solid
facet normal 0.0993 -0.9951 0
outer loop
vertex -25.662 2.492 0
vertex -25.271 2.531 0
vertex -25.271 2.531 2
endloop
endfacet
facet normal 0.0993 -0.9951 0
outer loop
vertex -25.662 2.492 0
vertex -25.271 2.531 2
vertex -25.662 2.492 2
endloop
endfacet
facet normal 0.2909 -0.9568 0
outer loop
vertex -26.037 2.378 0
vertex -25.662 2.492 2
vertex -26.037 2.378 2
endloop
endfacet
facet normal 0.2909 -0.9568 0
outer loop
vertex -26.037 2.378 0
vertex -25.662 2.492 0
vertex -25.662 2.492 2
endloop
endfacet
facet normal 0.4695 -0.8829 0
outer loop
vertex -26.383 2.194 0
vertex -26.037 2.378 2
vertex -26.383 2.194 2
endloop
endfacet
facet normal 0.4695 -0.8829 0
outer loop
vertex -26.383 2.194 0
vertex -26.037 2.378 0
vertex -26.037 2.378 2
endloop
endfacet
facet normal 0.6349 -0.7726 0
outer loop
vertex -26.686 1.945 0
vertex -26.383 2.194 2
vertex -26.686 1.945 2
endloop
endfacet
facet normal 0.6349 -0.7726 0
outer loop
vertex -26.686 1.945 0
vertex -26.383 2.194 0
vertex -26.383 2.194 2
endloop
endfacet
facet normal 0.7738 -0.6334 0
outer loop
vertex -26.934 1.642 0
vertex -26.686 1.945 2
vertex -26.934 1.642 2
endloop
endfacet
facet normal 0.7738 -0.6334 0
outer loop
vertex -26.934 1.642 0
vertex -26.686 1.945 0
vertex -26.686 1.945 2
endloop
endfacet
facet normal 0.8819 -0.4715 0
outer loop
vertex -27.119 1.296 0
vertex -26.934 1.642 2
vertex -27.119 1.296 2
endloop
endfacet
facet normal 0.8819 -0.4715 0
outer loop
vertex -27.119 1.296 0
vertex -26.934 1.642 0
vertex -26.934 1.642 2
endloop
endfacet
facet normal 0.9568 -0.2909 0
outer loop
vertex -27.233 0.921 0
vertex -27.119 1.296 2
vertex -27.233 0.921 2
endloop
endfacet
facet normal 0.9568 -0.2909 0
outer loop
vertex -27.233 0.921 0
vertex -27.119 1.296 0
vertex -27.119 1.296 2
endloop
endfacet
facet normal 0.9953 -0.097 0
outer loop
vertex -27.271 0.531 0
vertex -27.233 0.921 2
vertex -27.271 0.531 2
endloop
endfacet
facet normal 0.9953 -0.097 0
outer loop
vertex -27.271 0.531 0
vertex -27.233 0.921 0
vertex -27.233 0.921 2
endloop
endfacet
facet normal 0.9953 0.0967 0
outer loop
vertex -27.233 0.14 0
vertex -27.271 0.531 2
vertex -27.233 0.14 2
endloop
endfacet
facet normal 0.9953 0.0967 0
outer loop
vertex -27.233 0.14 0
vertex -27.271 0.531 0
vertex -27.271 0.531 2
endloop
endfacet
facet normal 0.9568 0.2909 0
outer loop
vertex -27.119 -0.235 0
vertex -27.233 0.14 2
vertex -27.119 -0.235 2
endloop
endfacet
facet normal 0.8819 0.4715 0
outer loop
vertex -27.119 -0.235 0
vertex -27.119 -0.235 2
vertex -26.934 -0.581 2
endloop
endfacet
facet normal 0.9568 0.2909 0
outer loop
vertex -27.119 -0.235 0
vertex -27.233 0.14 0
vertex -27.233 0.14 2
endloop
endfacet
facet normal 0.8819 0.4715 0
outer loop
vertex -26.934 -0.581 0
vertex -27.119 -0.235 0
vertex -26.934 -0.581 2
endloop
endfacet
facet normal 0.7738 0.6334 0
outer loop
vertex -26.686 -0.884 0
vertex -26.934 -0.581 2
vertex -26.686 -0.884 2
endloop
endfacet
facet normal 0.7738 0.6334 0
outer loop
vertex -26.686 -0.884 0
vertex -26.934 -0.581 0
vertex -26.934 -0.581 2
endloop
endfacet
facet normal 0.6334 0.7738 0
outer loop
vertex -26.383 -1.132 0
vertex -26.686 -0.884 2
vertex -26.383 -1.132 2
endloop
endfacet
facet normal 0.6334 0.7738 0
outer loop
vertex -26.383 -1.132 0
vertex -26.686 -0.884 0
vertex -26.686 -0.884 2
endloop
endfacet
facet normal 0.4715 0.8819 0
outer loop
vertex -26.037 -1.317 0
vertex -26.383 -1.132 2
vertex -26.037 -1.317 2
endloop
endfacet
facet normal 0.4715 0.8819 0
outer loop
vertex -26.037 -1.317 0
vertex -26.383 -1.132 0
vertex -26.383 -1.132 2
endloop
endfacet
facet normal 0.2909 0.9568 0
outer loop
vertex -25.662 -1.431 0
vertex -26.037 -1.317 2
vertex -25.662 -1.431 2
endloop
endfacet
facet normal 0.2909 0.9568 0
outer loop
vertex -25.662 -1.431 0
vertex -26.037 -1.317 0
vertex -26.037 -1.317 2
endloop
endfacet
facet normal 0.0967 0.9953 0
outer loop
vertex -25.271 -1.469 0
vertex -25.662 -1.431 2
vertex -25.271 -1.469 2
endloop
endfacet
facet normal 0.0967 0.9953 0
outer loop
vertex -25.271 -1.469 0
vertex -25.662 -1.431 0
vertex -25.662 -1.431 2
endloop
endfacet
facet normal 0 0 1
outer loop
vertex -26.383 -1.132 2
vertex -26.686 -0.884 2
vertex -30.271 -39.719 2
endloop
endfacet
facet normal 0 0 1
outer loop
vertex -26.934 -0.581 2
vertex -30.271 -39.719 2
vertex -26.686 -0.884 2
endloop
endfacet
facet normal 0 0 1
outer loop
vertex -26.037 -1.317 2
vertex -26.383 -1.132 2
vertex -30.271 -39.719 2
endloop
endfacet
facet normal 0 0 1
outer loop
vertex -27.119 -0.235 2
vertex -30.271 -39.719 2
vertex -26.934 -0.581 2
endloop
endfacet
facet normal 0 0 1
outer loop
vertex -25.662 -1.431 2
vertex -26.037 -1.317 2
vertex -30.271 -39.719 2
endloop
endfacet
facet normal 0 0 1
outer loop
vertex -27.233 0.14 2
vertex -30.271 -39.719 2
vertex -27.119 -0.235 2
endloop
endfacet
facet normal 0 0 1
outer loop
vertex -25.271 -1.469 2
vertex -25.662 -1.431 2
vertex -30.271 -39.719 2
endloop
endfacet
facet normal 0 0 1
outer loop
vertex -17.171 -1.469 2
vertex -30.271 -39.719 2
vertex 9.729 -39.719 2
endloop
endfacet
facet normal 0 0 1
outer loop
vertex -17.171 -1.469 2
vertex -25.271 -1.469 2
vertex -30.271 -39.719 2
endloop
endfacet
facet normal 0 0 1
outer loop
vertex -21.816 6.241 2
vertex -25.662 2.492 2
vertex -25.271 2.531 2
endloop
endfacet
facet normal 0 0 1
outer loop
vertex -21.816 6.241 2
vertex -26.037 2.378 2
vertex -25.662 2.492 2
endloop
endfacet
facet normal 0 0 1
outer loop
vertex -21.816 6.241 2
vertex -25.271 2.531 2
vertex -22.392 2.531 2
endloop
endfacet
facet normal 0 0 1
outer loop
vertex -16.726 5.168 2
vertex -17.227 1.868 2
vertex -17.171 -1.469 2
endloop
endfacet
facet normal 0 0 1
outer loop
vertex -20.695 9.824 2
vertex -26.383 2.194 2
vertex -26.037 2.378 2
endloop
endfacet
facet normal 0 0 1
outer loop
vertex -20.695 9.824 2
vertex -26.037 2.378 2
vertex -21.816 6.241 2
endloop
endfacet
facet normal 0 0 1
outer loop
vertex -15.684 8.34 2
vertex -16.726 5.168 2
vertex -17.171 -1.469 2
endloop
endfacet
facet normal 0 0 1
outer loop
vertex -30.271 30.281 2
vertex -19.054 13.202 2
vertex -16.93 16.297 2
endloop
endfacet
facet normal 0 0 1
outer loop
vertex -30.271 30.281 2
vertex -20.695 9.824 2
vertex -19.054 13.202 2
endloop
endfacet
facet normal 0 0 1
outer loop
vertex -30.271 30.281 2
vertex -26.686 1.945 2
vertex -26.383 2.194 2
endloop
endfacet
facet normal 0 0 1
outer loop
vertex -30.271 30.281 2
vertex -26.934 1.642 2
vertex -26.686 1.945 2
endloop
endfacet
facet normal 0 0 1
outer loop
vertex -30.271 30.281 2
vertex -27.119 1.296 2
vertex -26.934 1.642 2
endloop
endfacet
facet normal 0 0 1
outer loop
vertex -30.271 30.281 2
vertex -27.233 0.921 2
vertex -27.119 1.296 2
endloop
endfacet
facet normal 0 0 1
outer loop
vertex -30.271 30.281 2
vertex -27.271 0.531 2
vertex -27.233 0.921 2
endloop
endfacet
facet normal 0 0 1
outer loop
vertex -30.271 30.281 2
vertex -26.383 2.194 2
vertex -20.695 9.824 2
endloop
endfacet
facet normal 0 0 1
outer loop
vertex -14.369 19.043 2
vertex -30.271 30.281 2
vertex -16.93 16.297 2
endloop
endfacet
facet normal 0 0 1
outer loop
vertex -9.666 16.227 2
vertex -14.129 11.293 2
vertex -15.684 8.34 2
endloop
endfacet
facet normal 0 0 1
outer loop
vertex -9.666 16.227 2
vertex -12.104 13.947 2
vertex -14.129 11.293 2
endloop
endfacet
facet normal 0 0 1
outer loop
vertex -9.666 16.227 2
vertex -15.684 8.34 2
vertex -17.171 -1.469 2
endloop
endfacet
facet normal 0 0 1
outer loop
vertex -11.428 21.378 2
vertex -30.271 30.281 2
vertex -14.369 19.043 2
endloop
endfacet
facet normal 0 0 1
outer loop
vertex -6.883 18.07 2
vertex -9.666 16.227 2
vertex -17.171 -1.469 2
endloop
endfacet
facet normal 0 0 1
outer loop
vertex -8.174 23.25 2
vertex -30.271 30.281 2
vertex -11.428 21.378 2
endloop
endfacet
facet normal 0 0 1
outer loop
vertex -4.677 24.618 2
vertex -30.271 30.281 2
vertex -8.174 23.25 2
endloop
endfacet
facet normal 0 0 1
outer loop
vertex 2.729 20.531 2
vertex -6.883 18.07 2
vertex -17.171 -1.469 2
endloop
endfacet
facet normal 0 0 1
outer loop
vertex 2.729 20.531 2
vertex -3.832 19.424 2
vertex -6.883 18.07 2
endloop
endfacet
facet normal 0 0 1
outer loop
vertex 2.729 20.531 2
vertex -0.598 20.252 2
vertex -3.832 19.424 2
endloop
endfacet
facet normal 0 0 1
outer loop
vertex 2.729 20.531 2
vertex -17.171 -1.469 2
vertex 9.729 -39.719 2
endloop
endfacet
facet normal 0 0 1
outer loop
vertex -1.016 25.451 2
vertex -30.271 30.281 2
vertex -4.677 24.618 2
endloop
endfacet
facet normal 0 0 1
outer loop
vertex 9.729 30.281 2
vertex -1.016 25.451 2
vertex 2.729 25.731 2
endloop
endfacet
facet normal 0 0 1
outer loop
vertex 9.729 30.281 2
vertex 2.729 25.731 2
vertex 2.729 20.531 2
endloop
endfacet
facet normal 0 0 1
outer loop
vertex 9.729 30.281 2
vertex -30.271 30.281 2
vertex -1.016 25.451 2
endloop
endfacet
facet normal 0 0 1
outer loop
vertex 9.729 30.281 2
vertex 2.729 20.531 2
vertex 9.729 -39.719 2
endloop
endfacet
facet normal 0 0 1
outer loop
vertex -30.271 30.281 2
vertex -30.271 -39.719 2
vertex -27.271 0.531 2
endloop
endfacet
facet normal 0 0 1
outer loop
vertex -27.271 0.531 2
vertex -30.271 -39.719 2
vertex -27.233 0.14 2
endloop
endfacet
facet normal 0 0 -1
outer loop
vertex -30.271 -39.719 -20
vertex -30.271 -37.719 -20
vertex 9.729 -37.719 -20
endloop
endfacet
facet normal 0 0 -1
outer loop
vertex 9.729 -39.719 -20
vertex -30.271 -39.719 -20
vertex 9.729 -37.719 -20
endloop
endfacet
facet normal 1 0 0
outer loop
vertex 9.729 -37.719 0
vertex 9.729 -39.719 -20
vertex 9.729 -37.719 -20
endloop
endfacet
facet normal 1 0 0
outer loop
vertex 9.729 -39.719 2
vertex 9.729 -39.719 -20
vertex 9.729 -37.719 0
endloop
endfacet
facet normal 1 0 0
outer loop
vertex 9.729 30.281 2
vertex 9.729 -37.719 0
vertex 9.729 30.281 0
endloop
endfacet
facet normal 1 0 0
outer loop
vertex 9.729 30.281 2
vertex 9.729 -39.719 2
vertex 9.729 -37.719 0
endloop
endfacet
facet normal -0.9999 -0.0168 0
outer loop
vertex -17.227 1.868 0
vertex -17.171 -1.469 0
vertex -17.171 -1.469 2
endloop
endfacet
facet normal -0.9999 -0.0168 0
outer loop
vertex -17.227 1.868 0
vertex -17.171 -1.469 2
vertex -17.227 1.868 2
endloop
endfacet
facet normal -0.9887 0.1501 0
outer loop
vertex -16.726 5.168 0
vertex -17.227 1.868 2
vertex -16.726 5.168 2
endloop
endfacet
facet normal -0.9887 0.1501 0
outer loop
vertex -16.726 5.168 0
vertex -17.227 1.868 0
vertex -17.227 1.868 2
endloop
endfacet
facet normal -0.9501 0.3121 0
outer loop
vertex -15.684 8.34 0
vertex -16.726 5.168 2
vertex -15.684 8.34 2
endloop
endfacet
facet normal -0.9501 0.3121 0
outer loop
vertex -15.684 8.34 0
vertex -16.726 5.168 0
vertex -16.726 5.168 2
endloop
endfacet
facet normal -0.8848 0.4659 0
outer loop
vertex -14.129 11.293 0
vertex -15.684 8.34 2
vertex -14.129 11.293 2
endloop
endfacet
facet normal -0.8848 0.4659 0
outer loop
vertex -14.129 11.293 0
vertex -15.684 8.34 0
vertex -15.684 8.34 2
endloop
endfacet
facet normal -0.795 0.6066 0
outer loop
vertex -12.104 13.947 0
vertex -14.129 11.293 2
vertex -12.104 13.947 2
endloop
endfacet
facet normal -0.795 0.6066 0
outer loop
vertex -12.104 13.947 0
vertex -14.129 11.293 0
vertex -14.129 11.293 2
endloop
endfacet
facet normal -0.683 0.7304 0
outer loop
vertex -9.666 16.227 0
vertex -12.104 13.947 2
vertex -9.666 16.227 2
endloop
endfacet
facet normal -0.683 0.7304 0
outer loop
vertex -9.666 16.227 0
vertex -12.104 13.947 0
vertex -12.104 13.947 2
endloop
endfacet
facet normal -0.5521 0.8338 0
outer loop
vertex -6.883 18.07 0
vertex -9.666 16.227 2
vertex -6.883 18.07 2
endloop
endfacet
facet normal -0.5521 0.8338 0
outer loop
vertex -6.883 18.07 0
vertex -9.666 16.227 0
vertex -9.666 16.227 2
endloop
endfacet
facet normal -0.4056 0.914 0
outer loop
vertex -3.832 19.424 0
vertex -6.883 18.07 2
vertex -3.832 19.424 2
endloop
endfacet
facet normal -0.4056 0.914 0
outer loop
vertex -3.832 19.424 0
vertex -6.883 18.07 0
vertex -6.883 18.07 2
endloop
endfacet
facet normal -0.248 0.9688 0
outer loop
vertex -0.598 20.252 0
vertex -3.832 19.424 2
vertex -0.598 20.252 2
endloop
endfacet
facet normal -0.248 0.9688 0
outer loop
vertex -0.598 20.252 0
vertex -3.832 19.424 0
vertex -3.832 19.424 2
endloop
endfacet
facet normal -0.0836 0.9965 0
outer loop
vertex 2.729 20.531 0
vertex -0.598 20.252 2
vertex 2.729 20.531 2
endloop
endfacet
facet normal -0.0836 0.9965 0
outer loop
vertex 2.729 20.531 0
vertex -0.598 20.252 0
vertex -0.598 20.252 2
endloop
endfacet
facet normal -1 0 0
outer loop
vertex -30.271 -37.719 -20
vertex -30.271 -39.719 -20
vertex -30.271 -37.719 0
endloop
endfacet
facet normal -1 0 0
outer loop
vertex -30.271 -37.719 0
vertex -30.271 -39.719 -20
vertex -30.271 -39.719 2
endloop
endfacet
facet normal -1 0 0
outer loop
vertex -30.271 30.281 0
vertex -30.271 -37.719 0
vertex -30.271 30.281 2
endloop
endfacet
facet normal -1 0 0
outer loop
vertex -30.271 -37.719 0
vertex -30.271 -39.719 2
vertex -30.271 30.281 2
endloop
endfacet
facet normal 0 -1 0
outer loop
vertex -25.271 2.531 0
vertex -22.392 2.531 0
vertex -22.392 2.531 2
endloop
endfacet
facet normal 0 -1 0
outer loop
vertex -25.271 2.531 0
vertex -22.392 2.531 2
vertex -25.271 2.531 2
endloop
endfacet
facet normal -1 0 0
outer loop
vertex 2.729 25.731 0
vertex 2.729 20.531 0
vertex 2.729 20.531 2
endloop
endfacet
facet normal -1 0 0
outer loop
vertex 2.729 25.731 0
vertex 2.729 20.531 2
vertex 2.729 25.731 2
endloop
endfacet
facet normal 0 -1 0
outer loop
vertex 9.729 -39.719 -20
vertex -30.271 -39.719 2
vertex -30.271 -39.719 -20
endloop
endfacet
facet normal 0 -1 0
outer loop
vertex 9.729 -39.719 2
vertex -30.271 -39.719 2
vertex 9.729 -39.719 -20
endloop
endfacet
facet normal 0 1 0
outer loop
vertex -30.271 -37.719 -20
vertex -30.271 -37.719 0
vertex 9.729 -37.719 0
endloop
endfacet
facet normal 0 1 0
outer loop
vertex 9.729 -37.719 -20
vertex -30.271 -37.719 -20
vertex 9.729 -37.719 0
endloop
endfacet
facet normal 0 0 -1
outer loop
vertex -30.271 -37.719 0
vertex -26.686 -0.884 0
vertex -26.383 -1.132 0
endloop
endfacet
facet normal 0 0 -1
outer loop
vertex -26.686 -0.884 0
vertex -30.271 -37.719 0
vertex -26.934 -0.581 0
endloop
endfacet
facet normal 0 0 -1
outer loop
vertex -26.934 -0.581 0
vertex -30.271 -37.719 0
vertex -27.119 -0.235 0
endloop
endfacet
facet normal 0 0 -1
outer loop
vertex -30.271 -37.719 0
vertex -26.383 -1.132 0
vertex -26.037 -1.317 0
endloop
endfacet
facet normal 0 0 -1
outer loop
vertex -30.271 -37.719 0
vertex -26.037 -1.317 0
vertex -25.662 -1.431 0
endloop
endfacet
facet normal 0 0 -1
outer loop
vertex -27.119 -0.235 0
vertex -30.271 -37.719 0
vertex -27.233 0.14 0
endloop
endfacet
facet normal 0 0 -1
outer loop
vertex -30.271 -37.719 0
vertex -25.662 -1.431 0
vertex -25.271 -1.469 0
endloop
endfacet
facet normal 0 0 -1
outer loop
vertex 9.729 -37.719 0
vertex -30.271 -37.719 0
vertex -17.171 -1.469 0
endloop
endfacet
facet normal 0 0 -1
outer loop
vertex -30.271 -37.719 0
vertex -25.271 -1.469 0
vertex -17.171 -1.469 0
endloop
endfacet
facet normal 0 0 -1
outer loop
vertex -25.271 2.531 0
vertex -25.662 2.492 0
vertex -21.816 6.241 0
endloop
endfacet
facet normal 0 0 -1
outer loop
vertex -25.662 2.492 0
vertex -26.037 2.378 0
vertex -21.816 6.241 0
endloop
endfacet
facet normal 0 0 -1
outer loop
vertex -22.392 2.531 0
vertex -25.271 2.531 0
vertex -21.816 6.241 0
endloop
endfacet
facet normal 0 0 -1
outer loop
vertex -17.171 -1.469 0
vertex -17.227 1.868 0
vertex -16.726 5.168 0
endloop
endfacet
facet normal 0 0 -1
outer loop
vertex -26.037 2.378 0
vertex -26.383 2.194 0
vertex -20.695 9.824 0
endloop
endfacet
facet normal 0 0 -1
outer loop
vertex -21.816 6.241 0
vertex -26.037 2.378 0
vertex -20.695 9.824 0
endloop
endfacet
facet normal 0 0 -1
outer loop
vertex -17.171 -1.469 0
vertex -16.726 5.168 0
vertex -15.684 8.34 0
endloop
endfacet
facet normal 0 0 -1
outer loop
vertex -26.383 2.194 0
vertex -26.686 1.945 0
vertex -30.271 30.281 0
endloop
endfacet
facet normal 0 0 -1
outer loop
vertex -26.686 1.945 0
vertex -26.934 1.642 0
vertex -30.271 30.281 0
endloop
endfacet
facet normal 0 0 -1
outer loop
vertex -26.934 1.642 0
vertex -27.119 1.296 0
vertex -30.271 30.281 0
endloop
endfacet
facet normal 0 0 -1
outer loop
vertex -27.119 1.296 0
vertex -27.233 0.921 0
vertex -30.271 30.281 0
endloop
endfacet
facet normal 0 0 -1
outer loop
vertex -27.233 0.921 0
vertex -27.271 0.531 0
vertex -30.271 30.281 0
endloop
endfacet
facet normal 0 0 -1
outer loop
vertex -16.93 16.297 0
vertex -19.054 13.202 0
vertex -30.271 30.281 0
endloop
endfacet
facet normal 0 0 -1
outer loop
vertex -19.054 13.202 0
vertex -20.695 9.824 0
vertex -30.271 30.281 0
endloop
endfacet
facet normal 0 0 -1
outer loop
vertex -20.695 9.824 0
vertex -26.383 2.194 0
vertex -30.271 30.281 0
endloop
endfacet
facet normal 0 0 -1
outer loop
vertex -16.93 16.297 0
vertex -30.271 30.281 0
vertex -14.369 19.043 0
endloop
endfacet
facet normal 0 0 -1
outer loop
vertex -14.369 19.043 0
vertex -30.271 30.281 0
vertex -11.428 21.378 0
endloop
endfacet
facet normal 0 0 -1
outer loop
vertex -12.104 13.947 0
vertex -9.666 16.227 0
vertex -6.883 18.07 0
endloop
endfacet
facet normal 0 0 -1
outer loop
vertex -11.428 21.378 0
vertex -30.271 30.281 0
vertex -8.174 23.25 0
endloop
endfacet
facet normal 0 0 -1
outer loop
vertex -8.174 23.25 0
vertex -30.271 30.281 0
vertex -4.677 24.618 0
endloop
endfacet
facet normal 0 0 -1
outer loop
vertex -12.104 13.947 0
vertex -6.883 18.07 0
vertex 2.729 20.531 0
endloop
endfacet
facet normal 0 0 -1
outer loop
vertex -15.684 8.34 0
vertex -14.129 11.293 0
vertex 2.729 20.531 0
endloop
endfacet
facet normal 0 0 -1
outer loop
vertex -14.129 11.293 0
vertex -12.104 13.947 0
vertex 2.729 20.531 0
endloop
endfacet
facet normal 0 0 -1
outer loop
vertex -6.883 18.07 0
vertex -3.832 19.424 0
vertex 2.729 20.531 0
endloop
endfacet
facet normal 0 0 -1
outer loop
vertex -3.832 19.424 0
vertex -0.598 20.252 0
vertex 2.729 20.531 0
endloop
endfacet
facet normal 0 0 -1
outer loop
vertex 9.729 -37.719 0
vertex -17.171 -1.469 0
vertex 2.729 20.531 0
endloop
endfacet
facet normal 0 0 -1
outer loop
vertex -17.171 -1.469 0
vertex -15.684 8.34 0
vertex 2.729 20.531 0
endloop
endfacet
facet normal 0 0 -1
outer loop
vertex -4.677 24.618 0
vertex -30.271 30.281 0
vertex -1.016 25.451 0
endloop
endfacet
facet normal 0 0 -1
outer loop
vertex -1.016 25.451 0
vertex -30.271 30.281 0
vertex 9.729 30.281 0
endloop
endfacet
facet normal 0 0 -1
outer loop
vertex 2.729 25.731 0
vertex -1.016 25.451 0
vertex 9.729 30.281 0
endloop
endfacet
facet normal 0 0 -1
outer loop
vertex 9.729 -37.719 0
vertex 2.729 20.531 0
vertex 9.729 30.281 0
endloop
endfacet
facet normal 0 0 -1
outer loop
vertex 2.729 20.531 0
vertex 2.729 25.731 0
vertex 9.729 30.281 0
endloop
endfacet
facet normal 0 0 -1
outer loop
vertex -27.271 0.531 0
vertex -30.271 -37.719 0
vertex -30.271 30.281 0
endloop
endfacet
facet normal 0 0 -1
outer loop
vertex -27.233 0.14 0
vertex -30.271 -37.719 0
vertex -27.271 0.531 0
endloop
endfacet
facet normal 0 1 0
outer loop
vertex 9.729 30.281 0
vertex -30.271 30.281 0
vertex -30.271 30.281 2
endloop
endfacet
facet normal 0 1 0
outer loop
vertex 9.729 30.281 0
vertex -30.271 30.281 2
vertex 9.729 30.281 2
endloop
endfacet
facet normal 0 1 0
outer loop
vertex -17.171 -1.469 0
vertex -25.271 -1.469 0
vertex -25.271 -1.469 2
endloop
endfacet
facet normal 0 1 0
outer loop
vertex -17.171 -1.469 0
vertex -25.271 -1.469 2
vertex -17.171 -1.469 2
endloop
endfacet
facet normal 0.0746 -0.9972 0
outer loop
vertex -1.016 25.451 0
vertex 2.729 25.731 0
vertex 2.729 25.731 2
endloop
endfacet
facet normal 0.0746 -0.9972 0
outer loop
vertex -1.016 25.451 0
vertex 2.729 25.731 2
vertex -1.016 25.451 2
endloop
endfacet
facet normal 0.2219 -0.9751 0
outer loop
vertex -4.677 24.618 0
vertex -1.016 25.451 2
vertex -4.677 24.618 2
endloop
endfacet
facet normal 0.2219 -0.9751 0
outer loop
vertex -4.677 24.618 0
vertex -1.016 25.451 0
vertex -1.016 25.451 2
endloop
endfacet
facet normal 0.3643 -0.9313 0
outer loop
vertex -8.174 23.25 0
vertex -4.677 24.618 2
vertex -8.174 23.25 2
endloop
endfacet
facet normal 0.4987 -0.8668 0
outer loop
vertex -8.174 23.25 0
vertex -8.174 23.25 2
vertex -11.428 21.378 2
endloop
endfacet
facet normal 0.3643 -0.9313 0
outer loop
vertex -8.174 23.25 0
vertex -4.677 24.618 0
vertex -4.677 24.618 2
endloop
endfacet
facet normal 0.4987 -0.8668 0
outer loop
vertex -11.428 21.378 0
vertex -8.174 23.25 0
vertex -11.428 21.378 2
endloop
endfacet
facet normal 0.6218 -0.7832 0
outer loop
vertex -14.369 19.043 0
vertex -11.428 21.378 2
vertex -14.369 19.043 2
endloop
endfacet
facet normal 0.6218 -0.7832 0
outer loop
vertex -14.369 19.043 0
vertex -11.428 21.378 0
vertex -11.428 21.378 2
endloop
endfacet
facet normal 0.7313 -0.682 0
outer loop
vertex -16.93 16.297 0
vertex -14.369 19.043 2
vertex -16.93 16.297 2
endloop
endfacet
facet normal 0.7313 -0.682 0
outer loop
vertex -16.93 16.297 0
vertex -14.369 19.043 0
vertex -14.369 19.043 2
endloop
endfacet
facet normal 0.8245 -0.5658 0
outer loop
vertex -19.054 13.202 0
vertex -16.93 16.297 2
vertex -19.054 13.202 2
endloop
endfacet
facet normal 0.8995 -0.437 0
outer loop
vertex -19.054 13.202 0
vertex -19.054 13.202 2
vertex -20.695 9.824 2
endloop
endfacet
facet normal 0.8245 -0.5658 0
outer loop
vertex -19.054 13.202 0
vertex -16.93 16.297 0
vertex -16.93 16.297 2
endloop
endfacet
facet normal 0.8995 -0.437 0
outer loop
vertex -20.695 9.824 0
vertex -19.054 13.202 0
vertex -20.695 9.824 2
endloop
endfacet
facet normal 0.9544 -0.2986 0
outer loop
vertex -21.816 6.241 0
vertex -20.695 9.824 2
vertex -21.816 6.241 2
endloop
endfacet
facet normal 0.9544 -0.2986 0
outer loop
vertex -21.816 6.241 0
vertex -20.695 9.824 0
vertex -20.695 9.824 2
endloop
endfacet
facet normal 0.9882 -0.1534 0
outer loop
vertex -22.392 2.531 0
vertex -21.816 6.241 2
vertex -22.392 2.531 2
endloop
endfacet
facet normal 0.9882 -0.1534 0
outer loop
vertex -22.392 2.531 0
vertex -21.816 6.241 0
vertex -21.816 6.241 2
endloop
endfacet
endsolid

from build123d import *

# Parameters (mm, degrees)
SKETCH_1_W      = 40
SKETCH_1_H      = 70
EXTRUDE_1_DEPTH = 2
SKETCH_2_W      = 40
SKETCH_2_H      = 2
EXTRUDE_2_DEPTH = 22


with BuildPart() as part:
    # 草图1 → 凸台-拉伸1 (new body)
    with BuildSketch(Plane.XY):
        with Locations((-10.271445819, -4.719420773)):
            Rectangle(SKETCH_1_W, SKETCH_1_H)
        with BuildLine():
            Line((-25.271445819, -1.469420773), (-21.271445819, -1.469420773))
            Line((-21.271445819, -1.469420773), (-17.171194561, -1.469420773))
            ThreePointArc((-17.171194561, -1.469420773), (-12.103842793, 13.946987092), (2.728554181, 20.530579227))
            Line((2.728554181, 20.530579227), (2.728554181, 25.730579227))
            ThreePointArc((2.728554181, 25.730579227), (-14.368814038, 19.043277572), (-22.391955368, 2.530579227))
            Line((-22.391955368, 2.530579227), (-25.271445819, 2.530579227))
            ThreePointArc((-25.271445819, 2.530579227), (-27.271445819, 0.530579227), (-25.271445819, -1.469420773))
        make_face(mode=Mode.SUBTRACT)
    extrude(amount=EXTRUDE_1_DEPTH)

    # 草图2 → 凸台-拉伸2 (add)
    with BuildSketch(Plane.XY.offset(2)):
        with Locations((-10.271445819, -38.719420773)):
            Rectangle(SKETCH_2_W, SKETCH_2_H)
    extrude(amount=-EXTRUDE_2_DEPTH)


solid = part.part
